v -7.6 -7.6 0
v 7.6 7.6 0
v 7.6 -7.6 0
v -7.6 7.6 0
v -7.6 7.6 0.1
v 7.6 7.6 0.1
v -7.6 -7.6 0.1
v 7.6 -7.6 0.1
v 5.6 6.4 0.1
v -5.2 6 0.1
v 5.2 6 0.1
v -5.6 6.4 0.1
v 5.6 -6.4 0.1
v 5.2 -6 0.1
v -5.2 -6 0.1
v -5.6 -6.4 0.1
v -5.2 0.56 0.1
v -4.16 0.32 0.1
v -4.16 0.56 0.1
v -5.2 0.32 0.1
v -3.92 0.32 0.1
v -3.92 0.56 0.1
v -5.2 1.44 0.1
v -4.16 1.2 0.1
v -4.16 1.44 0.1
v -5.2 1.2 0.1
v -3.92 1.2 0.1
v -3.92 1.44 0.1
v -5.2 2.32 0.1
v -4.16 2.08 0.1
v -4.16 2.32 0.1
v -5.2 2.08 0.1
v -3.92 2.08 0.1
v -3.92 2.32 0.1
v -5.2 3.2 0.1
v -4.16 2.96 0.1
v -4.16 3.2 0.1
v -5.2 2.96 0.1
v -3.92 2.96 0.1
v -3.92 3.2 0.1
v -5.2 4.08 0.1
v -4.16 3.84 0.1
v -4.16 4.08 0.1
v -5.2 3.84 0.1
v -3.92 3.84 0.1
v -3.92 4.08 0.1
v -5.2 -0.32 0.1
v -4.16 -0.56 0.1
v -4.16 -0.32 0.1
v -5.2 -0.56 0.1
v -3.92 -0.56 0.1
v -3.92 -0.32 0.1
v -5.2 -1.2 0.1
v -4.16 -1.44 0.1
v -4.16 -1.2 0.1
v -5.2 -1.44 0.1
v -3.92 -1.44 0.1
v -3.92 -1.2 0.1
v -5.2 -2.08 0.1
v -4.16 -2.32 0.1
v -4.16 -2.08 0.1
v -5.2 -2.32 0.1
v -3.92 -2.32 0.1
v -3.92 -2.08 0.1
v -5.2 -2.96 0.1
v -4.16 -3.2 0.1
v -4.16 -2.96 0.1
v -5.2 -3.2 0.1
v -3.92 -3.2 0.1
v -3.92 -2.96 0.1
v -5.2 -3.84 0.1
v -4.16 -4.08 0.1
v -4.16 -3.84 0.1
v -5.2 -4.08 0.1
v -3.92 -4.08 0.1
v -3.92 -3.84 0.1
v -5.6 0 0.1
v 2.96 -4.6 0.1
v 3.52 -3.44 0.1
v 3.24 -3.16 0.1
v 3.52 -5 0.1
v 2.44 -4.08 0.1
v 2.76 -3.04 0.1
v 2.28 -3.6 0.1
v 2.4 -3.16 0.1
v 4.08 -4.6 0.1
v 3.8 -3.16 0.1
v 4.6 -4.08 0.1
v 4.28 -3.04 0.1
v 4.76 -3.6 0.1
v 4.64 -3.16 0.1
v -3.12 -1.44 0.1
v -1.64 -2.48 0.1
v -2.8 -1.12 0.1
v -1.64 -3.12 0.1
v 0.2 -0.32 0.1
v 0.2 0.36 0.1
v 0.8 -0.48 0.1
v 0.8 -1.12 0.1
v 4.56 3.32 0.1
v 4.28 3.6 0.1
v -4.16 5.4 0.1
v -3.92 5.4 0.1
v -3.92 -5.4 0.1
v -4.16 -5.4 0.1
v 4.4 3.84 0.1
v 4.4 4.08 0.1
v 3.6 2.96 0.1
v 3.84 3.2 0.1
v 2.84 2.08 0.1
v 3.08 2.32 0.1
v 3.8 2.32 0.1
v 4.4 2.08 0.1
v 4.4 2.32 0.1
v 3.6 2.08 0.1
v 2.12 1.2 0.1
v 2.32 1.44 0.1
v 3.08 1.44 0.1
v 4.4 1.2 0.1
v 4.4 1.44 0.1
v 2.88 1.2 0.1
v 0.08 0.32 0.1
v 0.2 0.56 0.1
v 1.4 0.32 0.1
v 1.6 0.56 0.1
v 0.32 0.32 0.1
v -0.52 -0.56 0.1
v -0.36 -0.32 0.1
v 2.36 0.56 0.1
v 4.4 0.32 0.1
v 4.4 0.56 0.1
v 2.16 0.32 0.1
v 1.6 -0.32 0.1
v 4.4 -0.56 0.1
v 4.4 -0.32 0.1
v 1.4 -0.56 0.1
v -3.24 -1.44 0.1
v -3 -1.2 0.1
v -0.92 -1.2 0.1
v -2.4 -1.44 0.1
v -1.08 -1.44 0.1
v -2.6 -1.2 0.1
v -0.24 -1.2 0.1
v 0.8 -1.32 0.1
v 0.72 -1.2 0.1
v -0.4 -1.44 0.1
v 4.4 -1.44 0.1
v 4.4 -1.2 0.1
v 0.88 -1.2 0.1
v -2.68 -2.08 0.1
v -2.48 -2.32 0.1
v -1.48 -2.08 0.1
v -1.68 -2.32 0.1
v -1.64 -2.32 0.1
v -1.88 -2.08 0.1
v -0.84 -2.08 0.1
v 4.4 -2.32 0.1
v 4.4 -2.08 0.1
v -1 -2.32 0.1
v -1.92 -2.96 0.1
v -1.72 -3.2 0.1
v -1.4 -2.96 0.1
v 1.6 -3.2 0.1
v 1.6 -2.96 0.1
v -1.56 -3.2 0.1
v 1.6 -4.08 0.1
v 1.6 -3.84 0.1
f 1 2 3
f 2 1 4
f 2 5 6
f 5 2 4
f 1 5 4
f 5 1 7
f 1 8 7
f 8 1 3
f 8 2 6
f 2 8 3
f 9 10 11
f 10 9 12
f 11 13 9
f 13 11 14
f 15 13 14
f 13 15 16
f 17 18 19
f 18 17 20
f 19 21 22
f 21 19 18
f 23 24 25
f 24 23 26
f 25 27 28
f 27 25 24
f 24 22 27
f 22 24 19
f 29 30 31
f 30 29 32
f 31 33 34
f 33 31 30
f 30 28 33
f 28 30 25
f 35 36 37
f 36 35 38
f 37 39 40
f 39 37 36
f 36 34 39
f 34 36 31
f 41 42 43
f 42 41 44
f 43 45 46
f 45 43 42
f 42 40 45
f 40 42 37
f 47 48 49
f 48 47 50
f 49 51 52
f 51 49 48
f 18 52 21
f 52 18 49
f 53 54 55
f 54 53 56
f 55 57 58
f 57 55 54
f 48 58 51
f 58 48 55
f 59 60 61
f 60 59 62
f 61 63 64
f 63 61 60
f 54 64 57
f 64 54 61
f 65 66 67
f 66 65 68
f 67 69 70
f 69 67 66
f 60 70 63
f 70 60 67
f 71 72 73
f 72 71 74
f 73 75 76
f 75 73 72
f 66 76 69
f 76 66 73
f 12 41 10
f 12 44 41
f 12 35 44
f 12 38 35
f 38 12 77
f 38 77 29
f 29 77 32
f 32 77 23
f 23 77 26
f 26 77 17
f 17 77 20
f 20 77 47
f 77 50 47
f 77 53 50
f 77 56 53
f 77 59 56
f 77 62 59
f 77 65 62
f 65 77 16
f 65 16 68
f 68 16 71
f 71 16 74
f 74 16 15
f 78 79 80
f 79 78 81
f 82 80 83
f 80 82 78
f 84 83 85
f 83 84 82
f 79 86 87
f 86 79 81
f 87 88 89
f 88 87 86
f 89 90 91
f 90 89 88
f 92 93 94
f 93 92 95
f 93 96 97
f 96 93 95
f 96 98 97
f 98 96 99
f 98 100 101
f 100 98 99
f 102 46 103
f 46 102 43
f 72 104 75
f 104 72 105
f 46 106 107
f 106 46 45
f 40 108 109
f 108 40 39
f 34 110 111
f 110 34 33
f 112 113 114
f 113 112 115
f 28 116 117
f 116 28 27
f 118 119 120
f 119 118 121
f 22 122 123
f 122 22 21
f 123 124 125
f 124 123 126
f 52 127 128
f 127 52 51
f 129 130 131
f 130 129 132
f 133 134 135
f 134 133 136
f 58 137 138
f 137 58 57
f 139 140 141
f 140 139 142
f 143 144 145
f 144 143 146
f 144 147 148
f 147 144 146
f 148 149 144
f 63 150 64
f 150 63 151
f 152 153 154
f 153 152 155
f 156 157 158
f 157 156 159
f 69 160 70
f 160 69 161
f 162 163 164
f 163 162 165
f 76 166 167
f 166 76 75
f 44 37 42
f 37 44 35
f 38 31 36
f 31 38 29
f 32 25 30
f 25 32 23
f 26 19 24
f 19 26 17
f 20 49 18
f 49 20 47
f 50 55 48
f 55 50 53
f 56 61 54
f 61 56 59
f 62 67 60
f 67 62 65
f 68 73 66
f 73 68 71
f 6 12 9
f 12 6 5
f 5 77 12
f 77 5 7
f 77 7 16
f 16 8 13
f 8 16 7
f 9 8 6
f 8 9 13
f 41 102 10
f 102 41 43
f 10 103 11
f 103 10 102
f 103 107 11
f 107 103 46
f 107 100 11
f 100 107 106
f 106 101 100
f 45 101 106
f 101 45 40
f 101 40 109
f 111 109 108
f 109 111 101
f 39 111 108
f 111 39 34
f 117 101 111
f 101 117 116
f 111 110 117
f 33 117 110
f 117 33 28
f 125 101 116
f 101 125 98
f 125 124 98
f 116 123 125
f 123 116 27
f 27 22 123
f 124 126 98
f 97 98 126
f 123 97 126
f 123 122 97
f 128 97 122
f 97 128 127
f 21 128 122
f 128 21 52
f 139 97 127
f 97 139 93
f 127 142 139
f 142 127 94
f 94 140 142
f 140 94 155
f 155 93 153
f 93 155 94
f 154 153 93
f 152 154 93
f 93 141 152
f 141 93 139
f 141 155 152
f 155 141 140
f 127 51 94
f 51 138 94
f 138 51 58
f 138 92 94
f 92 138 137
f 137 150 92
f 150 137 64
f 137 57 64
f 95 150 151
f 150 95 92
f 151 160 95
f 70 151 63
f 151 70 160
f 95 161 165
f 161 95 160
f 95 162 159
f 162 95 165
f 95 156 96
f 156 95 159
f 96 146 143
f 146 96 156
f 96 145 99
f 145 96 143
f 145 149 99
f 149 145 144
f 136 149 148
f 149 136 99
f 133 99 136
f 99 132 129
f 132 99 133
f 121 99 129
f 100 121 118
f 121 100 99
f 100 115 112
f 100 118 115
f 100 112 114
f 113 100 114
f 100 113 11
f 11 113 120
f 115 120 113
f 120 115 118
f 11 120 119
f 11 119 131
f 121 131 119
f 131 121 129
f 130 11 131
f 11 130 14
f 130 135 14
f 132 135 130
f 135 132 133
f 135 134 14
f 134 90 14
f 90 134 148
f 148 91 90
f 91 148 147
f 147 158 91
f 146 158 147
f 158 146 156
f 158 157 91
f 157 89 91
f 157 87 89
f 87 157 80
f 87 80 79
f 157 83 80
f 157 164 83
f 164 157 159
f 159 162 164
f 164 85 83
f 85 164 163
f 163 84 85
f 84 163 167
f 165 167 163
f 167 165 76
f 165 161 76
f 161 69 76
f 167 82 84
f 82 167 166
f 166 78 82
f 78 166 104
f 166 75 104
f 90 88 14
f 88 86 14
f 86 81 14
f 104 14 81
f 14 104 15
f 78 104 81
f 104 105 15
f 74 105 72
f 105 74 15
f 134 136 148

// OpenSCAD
// file: ../p/box5-12.scad
use <../lib.scad>
function ldraw_lib__box5_12() = [
// 0 Box with 5 Faces without Any Edges
// 0 Name: box5-12.dat
// 0 Author: Chris Dee [cwdee]
// 0 !LDRAW_ORG Primitive UPDATE 2009-02
// 0 !LICENSE Licensed under CC BY 4.0 : see CAreadme.txt
// 
// 0 BFC CERTIFY CCW
  [0,"BFC","CERTIFY"],
  [0,"BFC","CCW"],
// 
// 0 !HISTORY 2009-09-03 [PTadmin] Official Update 2009-02
// 
// 
// 4 16 1 1 1 1 1 -1 -1 1 -1 -1 1 1
  [4,16,1,1,1,1,1,-1,-1,1,-1,-1,1,1],
// 4 16 -1 0 1 1 0 1 1 1 1 -1 1 1
  [4,16,-1,0,1,1,0,1,1,1,1,-1,1,1],
// 4 16 -1 0 -1 -1 0 1 -1 1 1 -1 1 -1
  [4,16,-1,0,-1,-1,0,1,-1,1,1,-1,1,-1],
// 4 16 1 0 -1 -1 0 -1 -1 1 -1 1 1 -1
  [4,16,1,0,-1,-1,0,-1,-1,1,-1,1,1,-1],
// 4 16 1 0 1 1 0 -1 1 1 -1 1 1 1
  [4,16,1,0,1,1,0,-1,1,1,-1,1,1,1],
// 0
];
module ldraw_lib__box5_12(step=0, col=false, unit=2/5, alt=false, line=0.2, solid=!$preview)
    makepoly(ldraw_lib__box5_12(), step=step, col=col, unit=unit, alt=alt, line=line, solid=solid);
ldraw_lib__box5_12(line=0.2);
// main file
use <../lib.scad>
use <../p/box5-12.scad>
function ldraw_lib__4650852c() = [
// 0 Sticker  1.9 x  1.9 with Dark Pink Heart and Medical Chart
// 0 Name: 4650852c.dat
// 0 Author: Takeshi Takahashi [RainbowDolphin]
// 0 !LDRAW_ORG Part UPDATE 2024-08
// 0 !LICENSE Licensed under CC BY 4.0 : see CAreadme.txt
// 
// 0 BFC CERTIFY CCW
  [0,"BFC","CERTIFY"],
  [0,"BFC","CCW"],
// 
// 0 !KEYWORDS Set 3188, Vet
// 
// 0 !HISTORY 2024-09-30 [OrionP] Official Update 2024-08
// 
// 
// 1 16 0 -0.25 0 19 0 0 0 0.25 0 0 0 19 box5-12.dat
  [1,16,0,-0.25,0,19,0,0,0,0.25,0,0,0,19, ldraw_lib__box5_12()],
// 4 322 -14 -0.25 16 -13 -0.25 15 13 -0.25 15 14 -0.25 16
  [4,322,-14,-0.25,16,-13,-0.25,15,13,-0.25,15,14,-0.25,16],
// 4 322 14 -0.25 16 13 -0.25 15 13 -0.25 -15 14 -0.25 -16
  [4,322,14,-0.25,16,13,-0.25,15,13,-0.25,-15,14,-0.25,-16],
// 4 322 14 -0.25 -16 13 -0.25 -15 -13 -0.25 -15 -14 -0.25 -16
  [4,322,14,-0.25,-16,13,-0.25,-15,-13,-0.25,-15,-14,-0.25,-16],
// 4 322 -10.4 -0.25 1.4 -13 -0.25 1.4 -13 -0.25 0.8 -10.4 -0.25 0.8
  [4,322,-10.4,-0.25,1.4,-13,-0.25,1.4,-13,-0.25,0.8,-10.4,-0.25,0.8],
// 4 322 -9.8 -0.25 1.4 -10.4 -0.25 1.4 -10.4 -0.25 0.8 -9.8 -0.25 0.8
  [4,322,-9.8,-0.25,1.4,-10.4,-0.25,1.4,-10.4,-0.25,0.8,-9.8,-0.25,0.8],
// 4 322 -10.4 -0.25 3.6 -13 -0.25 3.6 -13 -0.25 3 -10.4 -0.25 3
  [4,322,-10.4,-0.25,3.6,-13,-0.25,3.6,-13,-0.25,3,-10.4,-0.25,3],
// 4 322 -9.8 -0.25 3.6 -10.4 -0.25 3.6 -10.4 -0.25 3 -9.8 -0.25 3
  [4,322,-9.8,-0.25,3.6,-10.4,-0.25,3.6,-10.4,-0.25,3,-9.8,-0.25,3],
// 4 322 -9.8 -0.25 3 -10.4 -0.25 3 -10.4 -0.25 1.4 -9.8 -0.25 1.4
  [4,322,-9.8,-0.25,3,-10.4,-0.25,3,-10.4,-0.25,1.4,-9.8,-0.25,1.4],
// 4 322 -10.4 -0.25 5.8 -13 -0.25 5.8 -13 -0.25 5.2 -10.4 -0.25 5.2
  [4,322,-10.4,-0.25,5.8,-13,-0.25,5.8,-13,-0.25,5.2,-10.4,-0.25,5.2],
// 4 322 -9.8 -0.25 5.8 -10.4 -0.25 5.8 -10.4 -0.25 5.2 -9.8 -0.25 5.2
  [4,322,-9.8,-0.25,5.8,-10.4,-0.25,5.8,-10.4,-0.25,5.2,-9.8,-0.25,5.2],
// 4 322 -9.8 -0.25 5.2 -10.4 -0.25 5.2 -10.4 -0.25 3.6 -9.8 -0.25 3.6
  [4,322,-9.8,-0.25,5.2,-10.4,-0.25,5.2,-10.4,-0.25,3.6,-9.8,-0.25,3.6],
// 4 322 -10.4 -0.25 8 -13 -0.25 8 -13 -0.25 7.4 -10.4 -0.25 7.4
  [4,322,-10.4,-0.25,8,-13,-0.25,8,-13,-0.25,7.4,-10.4,-0.25,7.4],
// 4 322 -9.8 -0.25 8 -10.4 -0.25 8 -10.4 -0.25 7.4 -9.8 -0.25 7.4
  [4,322,-9.8,-0.25,8,-10.4,-0.25,8,-10.4,-0.25,7.4,-9.8,-0.25,7.4],
// 4 322 -9.8 -0.25 7.4 -10.4 -0.25 7.4 -10.4 -0.25 5.8 -9.8 -0.25 5.8
  [4,322,-9.8,-0.25,7.4,-10.4,-0.25,7.4,-10.4,-0.25,5.8,-9.8,-0.25,5.8],
// 4 322 -10.4 -0.25 10.2 -13 -0.25 10.2 -13 -0.25 9.6 -10.4 -0.25 9.6
  [4,322,-10.4,-0.25,10.2,-13,-0.25,10.2,-13,-0.25,9.6,-10.4,-0.25,9.6],
// 4 322 -9.8 -0.25 10.2 -10.4 -0.25 10.2 -10.4 -0.25 9.6 -9.8 -0.25 9.6
  [4,322,-9.8,-0.25,10.2,-10.4,-0.25,10.2,-10.4,-0.25,9.6,-9.8,-0.25,9.6],
// 4 322 -9.8 -0.25 9.6 -10.4 -0.25 9.6 -10.4 -0.25 8 -9.8 -0.25 8
  [4,322,-9.8,-0.25,9.6,-10.4,-0.25,9.6,-10.4,-0.25,8,-9.8,-0.25,8],
// 4 322 -10.4 -0.25 -0.8 -13 -0.25 -0.8 -13 -0.25 -1.4 -10.4 -0.25 -1.4
  [4,322,-10.4,-0.25,-0.8,-13,-0.25,-0.8,-13,-0.25,-1.4,-10.4,-0.25,-1.4],
// 4 322 -9.8 -0.25 -0.8 -10.4 -0.25 -0.8 -10.4 -0.25 -1.4 -9.8 -0.25 -1.4
  [4,322,-9.8,-0.25,-0.8,-10.4,-0.25,-0.8,-10.4,-0.25,-1.4,-9.8,-0.25,-1.4],
// 4 322 -9.8 -0.25 0.8 -10.4 -0.25 0.8 -10.4 -0.25 -0.8 -9.8 -0.25 -0.8
  [4,322,-9.8,-0.25,0.8,-10.4,-0.25,0.8,-10.4,-0.25,-0.8,-9.8,-0.25,-0.8],
// 4 322 -10.4 -0.25 -3 -13 -0.25 -3 -13 -0.25 -3.6 -10.4 -0.25 -3.6
  [4,322,-10.4,-0.25,-3,-13,-0.25,-3,-13,-0.25,-3.6,-10.4,-0.25,-3.6],
// 4 322 -9.8 -0.25 -3 -10.4 -0.25 -3 -10.4 -0.25 -3.6 -9.8 -0.25 -3.6
  [4,322,-9.8,-0.25,-3,-10.4,-0.25,-3,-10.4,-0.25,-3.6,-9.8,-0.25,-3.6],
// 4 322 -9.8 -0.25 -1.4 -10.4 -0.25 -1.4 -10.4 -0.25 -3 -9.8 -0.25 -3
  [4,322,-9.8,-0.25,-1.4,-10.4,-0.25,-1.4,-10.4,-0.25,-3,-9.8,-0.25,-3],
// 4 322 -10.4 -0.25 -5.2 -13 -0.25 -5.2 -13 -0.25 -5.8 -10.4 -0.25 -5.8
  [4,322,-10.4,-0.25,-5.2,-13,-0.25,-5.2,-13,-0.25,-5.8,-10.4,-0.25,-5.8],
// 4 322 -9.8 -0.25 -5.2 -10.4 -0.25 -5.2 -10.4 -0.25 -5.8 -9.8 -0.25 -5.8
  [4,322,-9.8,-0.25,-5.2,-10.4,-0.25,-5.2,-10.4,-0.25,-5.8,-9.8,-0.25,-5.8],
// 4 322 -9.8 -0.25 -3.6 -10.4 -0.25 -3.6 -10.4 -0.25 -5.2 -9.8 -0.25 -5.2
  [4,322,-9.8,-0.25,-3.6,-10.4,-0.25,-3.6,-10.4,-0.25,-5.2,-9.8,-0.25,-5.2],
// 4 322 -10.4 -0.25 -7.4 -13 -0.25 -7.4 -13 -0.25 -8 -10.4 -0.25 -8
  [4,322,-10.4,-0.25,-7.4,-13,-0.25,-7.4,-13,-0.25,-8,-10.4,-0.25,-8],
// 4 322 -9.8 -0.25 -7.4 -10.4 -0.25 -7.4 -10.4 -0.25 -8 -9.8 -0.25 -8
  [4,322,-9.8,-0.25,-7.4,-10.4,-0.25,-7.4,-10.4,-0.25,-8,-9.8,-0.25,-8],
// 4 322 -9.8 -0.25 -5.8 -10.4 -0.25 -5.8 -10.4 -0.25 -7.4 -9.8 -0.25 -7.4
  [4,322,-9.8,-0.25,-5.8,-10.4,-0.25,-5.8,-10.4,-0.25,-7.4,-9.8,-0.25,-7.4],
// 4 322 -10.4 -0.25 -9.6 -13 -0.25 -9.6 -13 -0.25 -10.2 -10.4 -0.25 -10.2
  [4,322,-10.4,-0.25,-9.6,-13,-0.25,-9.6,-13,-0.25,-10.2,-10.4,-0.25,-10.2],
// 4 322 -9.8 -0.25 -9.6 -10.4 -0.25 -9.6 -10.4 -0.25 -10.2 -9.8 -0.25 -10.2
  [4,322,-9.8,-0.25,-9.6,-10.4,-0.25,-9.6,-10.4,-0.25,-10.2,-9.8,-0.25,-10.2],
// 4 322 -9.8 -0.25 -8 -10.4 -0.25 -8 -10.4 -0.25 -9.6 -9.8 -0.25 -9.6
  [4,322,-9.8,-0.25,-8,-10.4,-0.25,-8,-10.4,-0.25,-9.6,-9.8,-0.25,-9.6],
// 3 322 -14 -0.25 16 -13 -0.25 10.2 -13 -0.25 15
  [3,322,-14,-0.25,16,-13,-0.25,10.2,-13,-0.25,15],
// 3 322 -14 -0.25 16 -13 -0.25 9.6 -13 -0.25 10.2
  [3,322,-14,-0.25,16,-13,-0.25,9.6,-13,-0.25,10.2],
// 3 322 -14 -0.25 16 -13 -0.25 8 -13 -0.25 9.6
  [3,322,-14,-0.25,16,-13,-0.25,8,-13,-0.25,9.6],
// 4 322 -13 -0.25 7.4 -13 -0.25 8 -14 -0.25 16 -14 -0.25 0
  [4,322,-13,-0.25,7.4,-13,-0.25,8,-14,-0.25,16,-14,-0.25,0],
// 3 322 -13 -0.25 7.4 -14 -0.25 0 -13 -0.25 5.8
  [3,322,-13,-0.25,7.4,-14,-0.25,0,-13,-0.25,5.8],
// 3 322 -13 -0.25 5.8 -14 -0.25 0 -13 -0.25 5.2
  [3,322,-13,-0.25,5.8,-14,-0.25,0,-13,-0.25,5.2],
// 3 322 -13 -0.25 5.2 -14 -0.25 0 -13 -0.25 3.6
  [3,322,-13,-0.25,5.2,-14,-0.25,0,-13,-0.25,3.6],
// 3 322 -13 -0.25 3.6 -14 -0.25 0 -13 -0.25 3
  [3,322,-13,-0.25,3.6,-14,-0.25,0,-13,-0.25,3],
// 3 322 -13 -0.25 3 -14 -0.25 0 -13 -0.25 1.4
  [3,322,-13,-0.25,3,-14,-0.25,0,-13,-0.25,1.4],
// 3 322 -13 -0.25 1.4 -14 -0.25 0 -13 -0.25 0.8
  [3,322,-13,-0.25,1.4,-14,-0.25,0,-13,-0.25,0.8],
// 3 322 -13 -0.25 0.8 -14 -0.25 0 -13 -0.25 -0.8
  [3,322,-13,-0.25,0.8,-14,-0.25,0,-13,-0.25,-0.8],
// 3 322 -14 -0.25 0 -13 -0.25 -1.4 -13 -0.25 -0.8
  [3,322,-14,-0.25,0,-13,-0.25,-1.4,-13,-0.25,-0.8],
// 3 322 -14 -0.25 0 -13 -0.25 -3 -13 -0.25 -1.4
  [3,322,-14,-0.25,0,-13,-0.25,-3,-13,-0.25,-1.4],
// 3 322 -14 -0.25 0 -13 -0.25 -3.6 -13 -0.25 -3
  [3,322,-14,-0.25,0,-13,-0.25,-3.6,-13,-0.25,-3],
// 3 322 -14 -0.25 0 -13 -0.25 -5.2 -13 -0.25 -3.6
  [3,322,-14,-0.25,0,-13,-0.25,-5.2,-13,-0.25,-3.6],
// 3 322 -14 -0.25 0 -13 -0.25 -5.8 -13 -0.25 -5.2
  [3,322,-14,-0.25,0,-13,-0.25,-5.8,-13,-0.25,-5.2],
// 4 322 -13 -0.25 -7.4 -13 -0.25 -5.8 -14 -0.25 0 -14 -0.25 -16
  [4,322,-13,-0.25,-7.4,-13,-0.25,-5.8,-14,-0.25,0,-14,-0.25,-16],
// 3 322 -13 -0.25 -7.4 -14 -0.25 -16 -13 -0.25 -8
  [3,322,-13,-0.25,-7.4,-14,-0.25,-16,-13,-0.25,-8],
// 3 322 -13 -0.25 -8 -14 -0.25 -16 -13 -0.25 -9.6
  [3,322,-13,-0.25,-8,-14,-0.25,-16,-13,-0.25,-9.6],
// 3 322 -13 -0.25 -9.6 -14 -0.25 -16 -13 -0.25 -10.2
  [3,322,-13,-0.25,-9.6,-14,-0.25,-16,-13,-0.25,-10.2],
// 3 322 -13 -0.25 -10.2 -14 -0.25 -16 -13 -0.25 -15
  [3,322,-13,-0.25,-10.2,-14,-0.25,-16,-13,-0.25,-15],
// 4 5 7.4 -0.25 -11.5 8.8 -0.25 -12.5 8.8 -0.25 -8.6 8.1 -0.25 -7.9
  [4,5,7.4,-0.25,-11.5,8.8,-0.25,-12.5,8.8,-0.25,-8.6,8.1,-0.25,-7.9],
// 4 5 6.1 -0.25 -10.2 7.4 -0.25 -11.5 8.1 -0.25 -7.9 6.9 -0.25 -7.6
  [4,5,6.1,-0.25,-10.2,7.4,-0.25,-11.5,8.1,-0.25,-7.9,6.9,-0.25,-7.6],
// 4 5 5.7 -0.25 -9 6.1 -0.25 -10.2 6.9 -0.25 -7.6 6 -0.25 -7.9
  [4,5,5.7,-0.25,-9,6.1,-0.25,-10.2,6.9,-0.25,-7.6,6,-0.25,-7.9],
// 4 5 8.8 -0.25 -8.6 8.8 -0.25 -12.5 10.2 -0.25 -11.5 9.5 -0.25 -7.9
  [4,5,8.8,-0.25,-8.6,8.8,-0.25,-12.5,10.2,-0.25,-11.5,9.5,-0.25,-7.9],
// 4 5 9.5 -0.25 -7.9 10.2 -0.25 -11.5 11.5 -0.25 -10.2 10.7 -0.25 -7.6
  [4,5,9.5,-0.25,-7.9,10.2,-0.25,-11.5,11.5,-0.25,-10.2,10.7,-0.25,-7.6],
// 4 5 10.7 -0.25 -7.6 11.5 -0.25 -10.2 11.9 -0.25 -9 11.6 -0.25 -7.9
  [4,5,10.7,-0.25,-7.6,11.5,-0.25,-10.2,11.9,-0.25,-9,11.6,-0.25,-7.9],
// 4 5 -4.1 -0.25 -6.2 -7 -0.25 -2.8 -7.8 -0.25 -3.6 -4.1 -0.25 -7.8
  [4,5,-4.1,-0.25,-6.2,-7,-0.25,-2.8,-7.8,-0.25,-3.6,-4.1,-0.25,-7.8],
// 4 5 -4.1 -0.25 -6.2 -4.1 -0.25 -7.8 0.5 -0.25 -0.8 0.5 -0.25 0.9
  [4,5,-4.1,-0.25,-6.2,-4.1,-0.25,-7.8,0.5,-0.25,-0.8,0.5,-0.25,0.9],
// 4 5 2 -0.25 -1.2 0.5 -0.25 0.9 0.5 -0.25 -0.8 2 -0.25 -2.8
  [4,5,2,-0.25,-1.2,0.5,-0.25,0.9,0.5,-0.25,-0.8,2,-0.25,-2.8],
// 4 5 10.7 -0.25 9 2 -0.25 -1.2 2 -0.25 -2.8 11.4 -0.25 8.3
  [4,5,10.7,-0.25,9,2,-0.25,-1.2,2,-0.25,-2.8,11.4,-0.25,8.3],
// 4 322 -10.4 -0.25 10.2 -9.8 -0.25 10.2 -9.8 -0.25 13.5 -10.4 -0.25 13.5
  [4,322,-10.4,-0.25,10.2,-9.8,-0.25,10.2,-9.8,-0.25,13.5,-10.4,-0.25,13.5],
// 4 322 -9.8 -0.25 -10.2 -10.4 -0.25 -10.2 -10.4 -0.25 -13.5 -9.8 -0.25 -13.5
  [4,322,-9.8,-0.25,-10.2,-10.4,-0.25,-10.2,-10.4,-0.25,-13.5,-9.8,-0.25,-13.5],
// 4 322 11 -0.25 10.2 -9.8 -0.25 10.2 -9.8 -0.25 9.6 11 -0.25 9.6
  [4,322,11,-0.25,10.2,-9.8,-0.25,10.2,-9.8,-0.25,9.6,11,-0.25,9.6],
// 4 322 9.6 -0.25 8 -9.8 -0.25 8 -9.8 -0.25 7.4 9 -0.25 7.4
  [4,322,9.6,-0.25,8,-9.8,-0.25,8,-9.8,-0.25,7.4,9,-0.25,7.4],
// 4 322 7.7 -0.25 5.8 -9.8 -0.25 5.8 -9.8 -0.25 5.2 7.1 -0.25 5.2
  [4,322,7.7,-0.25,5.8,-9.8,-0.25,5.8,-9.8,-0.25,5.2,7.1,-0.25,5.2],
// 4 322 11 -0.25 5.2 11 -0.25 5.8 9.5 -0.25 5.8 9 -0.25 5.2
  [4,322,11,-0.25,5.2,11,-0.25,5.8,9.5,-0.25,5.8,9,-0.25,5.2],
// 4 322 5.8 -0.25 3.6 -9.8 -0.25 3.6 -9.8 -0.25 3 5.3 -0.25 3
  [4,322,5.8,-0.25,3.6,-9.8,-0.25,3.6,-9.8,-0.25,3,5.3,-0.25,3],
// 4 322 11 -0.25 3 11 -0.25 3.6 7.7 -0.25 3.6 7.2 -0.25 3
  [4,322,11,-0.25,3,11,-0.25,3.6,7.7,-0.25,3.6,7.2,-0.25,3],
// 4 322 -9.8 -0.25 1.4 -9.8 -0.25 0.8 0.2 -0.25 0.8 0.5 -0.25 1.4
  [4,322,-9.8,-0.25,1.4,-9.8,-0.25,0.8,0.2,-0.25,0.8,0.5,-0.25,1.4],
// 4 322 3.5 -0.25 0.8 4 -0.25 1.4 0.5 -0.25 1.4 0.8 -0.25 0.8
  [4,322,3.5,-0.25,0.8,4,-0.25,1.4,0.5,-0.25,1.4,0.8,-0.25,0.8],
// 4 322 -0.9 -0.25 -0.8 -9.8 -0.25 -0.8 -9.8 -0.25 -1.4 -1.3 -0.25 -1.4
  [4,322,-0.9,-0.25,-0.8,-9.8,-0.25,-0.8,-9.8,-0.25,-1.4,-1.3,-0.25,-1.4],
// 4 322 11 -0.25 0.8 11 -0.25 1.4 5.9 -0.25 1.4 5.4 -0.25 0.8
  [4,322,11,-0.25,0.8,11,-0.25,1.4,5.9,-0.25,1.4,5.4,-0.25,0.8],
// 4 322 11 -0.25 -1.4 11 -0.25 -0.8 4 -0.25 -0.8 3.5 -0.25 -1.4
  [4,322,11,-0.25,-1.4,11,-0.25,-0.8,4,-0.25,-0.8,3.5,-0.25,-1.4],
// 4 322 -7.5 -0.25 -3 -9.8 -0.25 -3 -9.8 -0.25 -3.6 -8.1 -0.25 -3.6
  [4,322,-7.5,-0.25,-3,-9.8,-0.25,-3,-9.8,-0.25,-3.6,-8.1,-0.25,-3.6],
// 4 322 -2.3 -0.25 -3 -6.5 -0.25 -3 -6 -0.25 -3.6 -2.7 -0.25 -3.6
  [4,322,-2.3,-0.25,-3,-6.5,-0.25,-3,-6,-0.25,-3.6,-2.7,-0.25,-3.6],
// 4 322 1.8 -0.25 -3 -0.6 -0.25 -3 -1 -0.25 -3.6 2 -0.25 -3.3
  [4,322,1.8,-0.25,-3,-0.6,-0.25,-3,-1,-0.25,-3.6,2,-0.25,-3.3],
// 4 322 2 -0.25 -3.3 -1 -0.25 -3.6 11 -0.25 -3.6 11 -0.25 -3
  [4,322,2,-0.25,-3.3,-1,-0.25,-3.6,11,-0.25,-3.6,11,-0.25,-3],
// 3 322 11 -0.25 -3 2.2 -0.25 -3 2 -0.25 -3.3
  [3,322,11,-0.25,-3,2.2,-0.25,-3,2,-0.25,-3.3],
// 4 322 -6.7 -0.25 -5.2 -9.8 -0.25 -5.2 -9.8 -0.25 -5.8 -6.2 -0.25 -5.8
  [4,322,-6.7,-0.25,-5.2,-9.8,-0.25,-5.2,-9.8,-0.25,-5.8,-6.2,-0.25,-5.8],
// 4 322 -3.7 -0.25 -5.2 -4.7 -0.25 -5.2 -4.2 -0.25 -5.8 -4.1 -0.25 -5.8
  [4,322,-3.7,-0.25,-5.2,-4.7,-0.25,-5.2,-4.2,-0.25,-5.8,-4.1,-0.25,-5.8],
// 4 322 11 -0.25 -5.2 -2.1 -0.25 -5.2 -2.5 -0.25 -5.8 11 -0.25 -5.8
  [4,322,11,-0.25,-5.2,-2.1,-0.25,-5.2,-2.5,-0.25,-5.8,11,-0.25,-5.8],
// 4 322 -4.8 -0.25 -7.4 -9.8 -0.25 -7.4 -9.8 -0.25 -8 -4.3 -0.25 -8
  [4,322,-4.8,-0.25,-7.4,-9.8,-0.25,-7.4,-9.8,-0.25,-8,-4.3,-0.25,-8],
// 4 322 -3.5 -0.25 -7.4 -3.9 -0.25 -8 4 -0.25 -8 4 -0.25 -7.4
  [4,322,-3.5,-0.25,-7.4,-3.9,-0.25,-8,4,-0.25,-8,4,-0.25,-7.4],
// 4 322 4 -0.25 -9.6 -9.8 -0.25 -9.6 -9.8 -0.25 -10.2 4 -0.25 -10.2
  [4,322,4,-0.25,-9.6,-9.8,-0.25,-9.6,-9.8,-0.25,-10.2,4,-0.25,-10.2],
// 4 15 -10.4 -0.25 9.6 -13 -0.25 9.6 -13 -0.25 8 -10.4 -0.25 8
  [4,15,-10.4,-0.25,9.6,-13,-0.25,9.6,-13,-0.25,8,-10.4,-0.25,8],
// 4 15 -10.4 -0.25 7.4 -13 -0.25 7.4 -13 -0.25 5.8 -10.4 -0.25 5.8
  [4,15,-10.4,-0.25,7.4,-13,-0.25,7.4,-13,-0.25,5.8,-10.4,-0.25,5.8],
// 4 15 -10.4 -0.25 5.2 -13 -0.25 5.2 -13 -0.25 3.6 -10.4 -0.25 3.6
  [4,15,-10.4,-0.25,5.2,-13,-0.25,5.2,-13,-0.25,3.6,-10.4,-0.25,3.6],
// 4 15 -10.4 -0.25 3 -13 -0.25 3 -13 -0.25 1.4 -10.4 -0.25 1.4
  [4,15,-10.4,-0.25,3,-13,-0.25,3,-13,-0.25,1.4,-10.4,-0.25,1.4],
// 4 15 -10.4 -0.25 0.8 -13 -0.25 0.8 -13 -0.25 -0.8 -10.4 -0.25 -0.8
  [4,15,-10.4,-0.25,0.8,-13,-0.25,0.8,-13,-0.25,-0.8,-10.4,-0.25,-0.8],
// 4 15 -10.4 -0.25 -1.4 -13 -0.25 -1.4 -13 -0.25 -3 -10.4 -0.25 -3
  [4,15,-10.4,-0.25,-1.4,-13,-0.25,-1.4,-13,-0.25,-3,-10.4,-0.25,-3],
// 4 15 -10.4 -0.25 -3.6 -13 -0.25 -3.6 -13 -0.25 -5.2 -10.4 -0.25 -5.2
  [4,15,-10.4,-0.25,-3.6,-13,-0.25,-3.6,-13,-0.25,-5.2,-10.4,-0.25,-5.2],
// 4 15 -10.4 -0.25 -5.8 -13 -0.25 -5.8 -13 -0.25 -7.4 -10.4 -0.25 -7.4
  [4,15,-10.4,-0.25,-5.8,-13,-0.25,-5.8,-13,-0.25,-7.4,-10.4,-0.25,-7.4],
// 4 15 -10.4 -0.25 -8 -13 -0.25 -8 -13 -0.25 -9.6 -10.4 -0.25 -9.6
  [4,15,-10.4,-0.25,-8,-13,-0.25,-8,-13,-0.25,-9.6,-10.4,-0.25,-9.6],
// 4 15 14 -0.25 16 19 -0.25 19 -19 -0.25 19 -14 -0.25 16
  [4,15,14,-0.25,16,19,-0.25,19,-19,-0.25,19,-14,-0.25,16],
// 4 15 -14 -0.25 0 -14 -0.25 16 -19 -0.25 19 -19 -0.25 -19
  [4,15,-14,-0.25,0,-14,-0.25,16,-19,-0.25,19,-19,-0.25,-19],
// 3 15 -14 -0.25 0 -19 -0.25 -19 -14 -0.25 -16
  [3,15,-14,-0.25,0,-19,-0.25,-19,-14,-0.25,-16],
// 4 15 14 -0.25 -16 -14 -0.25 -16 -19 -0.25 -19 19 -0.25 -19
  [4,15,14,-0.25,-16,-14,-0.25,-16,-19,-0.25,-19,19,-0.25,-19],
// 4 15 14 -0.25 16 14 -0.25 -16 19 -0.25 -19 19 -0.25 19
  [4,15,14,-0.25,16,14,-0.25,-16,19,-0.25,-19,19,-0.25,19],
// 4 15 -13 -0.25 15 -13 -0.25 10.2 -10.4 -0.25 10.2 -10.4 -0.25 13.5
  [4,15,-13,-0.25,15,-13,-0.25,10.2,-10.4,-0.25,10.2,-10.4,-0.25,13.5],
// 4 15 -13 -0.25 15 -10.4 -0.25 13.5 -9.8 -0.25 13.5 13 -0.25 15
  [4,15,-13,-0.25,15,-10.4,-0.25,13.5,-9.8,-0.25,13.5,13,-0.25,15],
// 4 15 11 -0.25 10.2 13 -0.25 15 -9.8 -0.25 13.5 -9.8 -0.25 10.2
  [4,15,11,-0.25,10.2,13,-0.25,15,-9.8,-0.25,13.5,-9.8,-0.25,10.2],
// 4 15 13 -0.25 15 11 -0.25 10.2 11 -0.25 9.6 11.4 -0.25 8.3
  [4,15,13,-0.25,15,11,-0.25,10.2,11,-0.25,9.6,11.4,-0.25,8.3],
// 3 15 11 -0.25 9.6 10.7 -0.25 9 11.4 -0.25 8.3
  [3,15,11,-0.25,9.6,10.7,-0.25,9,11.4,-0.25,8.3],
// 4 15 10.7 -0.25 9 11 -0.25 9.6 -9.8 -0.25 9.6 -9.8 -0.25 8
  [4,15,10.7,-0.25,9,11,-0.25,9.6,-9.8,-0.25,9.6,-9.8,-0.25,8],
// 3 15 10.7 -0.25 9 -9.8 -0.25 8 9.6 -0.25 8
  [3,15,10.7,-0.25,9,-9.8,-0.25,8,9.6,-0.25,8],
// 4 15 7.7 -0.25 5.8 10.7 -0.25 9 9.6 -0.25 8 9 -0.25 7.4
  [4,15,7.7,-0.25,5.8,10.7,-0.25,9,9.6,-0.25,8,9,-0.25,7.4],
// 4 15 -9.8 -0.25 5.8 7.7 -0.25 5.8 9 -0.25 7.4 -9.8 -0.25 7.4
  [4,15,-9.8,-0.25,5.8,7.7,-0.25,5.8,9,-0.25,7.4,-9.8,-0.25,7.4],
// 4 15 10.7 -0.25 9 7.7 -0.25 5.8 5.8 -0.25 3.6 5.3 -0.25 3
  [4,15,10.7,-0.25,9,7.7,-0.25,5.8,5.8,-0.25,3.6,5.3,-0.25,3],
// 3 15 7.7 -0.25 5.8 7.1 -0.25 5.2 5.8 -0.25 3.6
  [3,15,7.7,-0.25,5.8,7.1,-0.25,5.2,5.8,-0.25,3.6],
// 4 15 -9.8 -0.25 3.6 5.8 -0.25 3.6 7.1 -0.25 5.2 -9.8 -0.25 5.2
  [4,15,-9.8,-0.25,3.6,5.8,-0.25,3.6,7.1,-0.25,5.2,-9.8,-0.25,5.2],
// 4 15 2 -0.25 -1.2 10.7 -0.25 9 5.3 -0.25 3 4 -0.25 1.4
  [4,15,2,-0.25,-1.2,10.7,-0.25,9,5.3,-0.25,3,4,-0.25,1.4],
// 3 15 4 -0.25 1.4 3.5 -0.25 0.8 2 -0.25 -1.2
  [3,15,4,-0.25,1.4,3.5,-0.25,0.8,2,-0.25,-1.2],
// 4 15 0.5 -0.25 1.4 4 -0.25 1.4 5.3 -0.25 3 -9.8 -0.25 3
  [4,15,0.5,-0.25,1.4,4,-0.25,1.4,5.3,-0.25,3,-9.8,-0.25,3],
// 3 15 -9.8 -0.25 3 -9.8 -0.25 1.4 0.5 -0.25 1.4
  [3,15,-9.8,-0.25,3,-9.8,-0.25,1.4,0.5,-0.25,1.4],
// 3 15 3.5 -0.25 0.8 0.8 -0.25 0.8 2 -0.25 -1.2
  [3,15,3.5,-0.25,0.8,0.8,-0.25,0.8,2,-0.25,-1.2],
// 3 15 0.5 -0.25 0.9 2 -0.25 -1.2 0.8 -0.25 0.8
  [3,15,0.5,-0.25,0.9,2,-0.25,-1.2,0.8,-0.25,0.8],
// 3 15 0.5 -0.25 1.4 0.5 -0.25 0.9 0.8 -0.25 0.8
  [3,15,0.5,-0.25,1.4,0.5,-0.25,0.9,0.8,-0.25,0.8],
// 3 15 0.5 -0.25 1.4 0.2 -0.25 0.8 0.5 -0.25 0.9
  [3,15,0.5,-0.25,1.4,0.2,-0.25,0.8,0.5,-0.25,0.9],
// 4 15 0.5 -0.25 0.9 0.2 -0.25 0.8 -0.9 -0.25 -0.8 -1.3 -0.25 -1.4
  [4,15,0.5,-0.25,0.9,0.2,-0.25,0.8,-0.9,-0.25,-0.8,-1.3,-0.25,-1.4],
// 4 15 -0.9 -0.25 -0.8 0.2 -0.25 0.8 -9.8 -0.25 0.8 -9.8 -0.25 -0.8
  [4,15,-0.9,-0.25,-0.8,0.2,-0.25,0.8,-9.8,-0.25,0.8,-9.8,-0.25,-0.8],
// 4 15 0.5 -0.25 0.9 -1.3 -0.25 -1.4 -2.3 -0.25 -3 -4.1 -0.25 -6.2
  [4,15,0.5,-0.25,0.9,-1.3,-0.25,-1.4,-2.3,-0.25,-3,-4.1,-0.25,-6.2],
// 4 15 -6.5 -0.25 -3 -2.3 -0.25 -3 -1.3 -0.25 -1.4 -7 -0.25 -2.8
  [4,15,-6.5,-0.25,-3,-2.3,-0.25,-3,-1.3,-0.25,-1.4,-7,-0.25,-2.8],
// 4 15 -6 -0.25 -3.6 -6.5 -0.25 -3 -7 -0.25 -2.8 -4.7 -0.25 -5.2
  [4,15,-6,-0.25,-3.6,-6.5,-0.25,-3,-7,-0.25,-2.8,-4.7,-0.25,-5.2],
// 4 15 -4.7 -0.25 -5.2 -7 -0.25 -2.8 -4.1 -0.25 -6.2 -4.2 -0.25 -5.8
  [4,15,-4.7,-0.25,-5.2,-7,-0.25,-2.8,-4.1,-0.25,-6.2,-4.2,-0.25,-5.8],
// 3 15 -4.1 -0.25 -5.8 -4.2 -0.25 -5.8 -4.1 -0.25 -6.2
  [3,15,-4.1,-0.25,-5.8,-4.2,-0.25,-5.8,-4.1,-0.25,-6.2],
// 3 15 -3.7 -0.25 -5.2 -4.1 -0.25 -5.8 -4.1 -0.25 -6.2
  [3,15,-3.7,-0.25,-5.2,-4.1,-0.25,-5.8,-4.1,-0.25,-6.2],
// 4 15 -2.7 -0.25 -3.6 -3.7 -0.25 -5.2 -4.1 -0.25 -6.2 -2.3 -0.25 -3
  [4,15,-2.7,-0.25,-3.6,-3.7,-0.25,-5.2,-4.1,-0.25,-6.2,-2.3,-0.25,-3],
// 4 15 -3.7 -0.25 -5.2 -2.7 -0.25 -3.6 -6 -0.25 -3.6 -4.7 -0.25 -5.2
  [4,15,-3.7,-0.25,-5.2,-2.7,-0.25,-3.6,-6,-0.25,-3.6,-4.7,-0.25,-5.2],
// 3 15 -1.3 -0.25 -1.4 -9.8 -0.25 -1.4 -7 -0.25 -2.8
  [3,15,-1.3,-0.25,-1.4,-9.8,-0.25,-1.4,-7,-0.25,-2.8],
// 4 15 -7.5 -0.25 -3 -7 -0.25 -2.8 -9.8 -0.25 -1.4 -9.8 -0.25 -3
  [4,15,-7.5,-0.25,-3,-7,-0.25,-2.8,-9.8,-0.25,-1.4,-9.8,-0.25,-3],
// 4 15 -7.8 -0.25 -3.6 -7 -0.25 -2.8 -7.5 -0.25 -3 -8.1 -0.25 -3.6
  [4,15,-7.8,-0.25,-3.6,-7,-0.25,-2.8,-7.5,-0.25,-3,-8.1,-0.25,-3.6],
// 4 15 -7.8 -0.25 -3.6 -8.1 -0.25 -3.6 -9.8 -0.25 -5.2 -6.7 -0.25 -5.2
  [4,15,-7.8,-0.25,-3.6,-8.1,-0.25,-3.6,-9.8,-0.25,-5.2,-6.7,-0.25,-5.2],
// 3 15 -8.1 -0.25 -3.6 -9.8 -0.25 -3.6 -9.8 -0.25 -5.2
  [3,15,-8.1,-0.25,-3.6,-9.8,-0.25,-3.6,-9.8,-0.25,-5.2],
// 4 15 -7.8 -0.25 -3.6 -6.7 -0.25 -5.2 -6.2 -0.25 -5.8 -4.1 -0.25 -7.8
  [4,15,-7.8,-0.25,-3.6,-6.7,-0.25,-5.2,-6.2,-0.25,-5.8,-4.1,-0.25,-7.8],
// 3 15 -6.2 -0.25 -5.8 -4.8 -0.25 -7.4 -4.1 -0.25 -7.8
  [3,15,-6.2,-0.25,-5.8,-4.8,-0.25,-7.4,-4.1,-0.25,-7.8],
// 4 15 -4.8 -0.25 -7.4 -6.2 -0.25 -5.8 -9.8 -0.25 -5.8 -9.8 -0.25 -7.4
  [4,15,-4.8,-0.25,-7.4,-6.2,-0.25,-5.8,-9.8,-0.25,-5.8,-9.8,-0.25,-7.4],
// 4 15 -4.1 -0.25 -7.8 -4.8 -0.25 -7.4 -4.3 -0.25 -8 -3.9 -0.25 -8
  [4,15,-4.1,-0.25,-7.8,-4.8,-0.25,-7.4,-4.3,-0.25,-8,-3.9,-0.25,-8],
// 4 15 -4.1 -0.25 -7.8 -3.9 -0.25 -8 -3.5 -0.25 -7.4 -2.5 -0.25 -5.8
  [4,15,-4.1,-0.25,-7.8,-3.9,-0.25,-8,-3.5,-0.25,-7.4,-2.5,-0.25,-5.8],
// 4 15 -4.1 -0.25 -7.8 -2.5 -0.25 -5.8 -2.1 -0.25 -5.2 0.5 -0.25 -0.8
  [4,15,-4.1,-0.25,-7.8,-2.5,-0.25,-5.8,-2.1,-0.25,-5.2,0.5,-0.25,-0.8],
// 4 15 0.5 -0.25 -0.8 -2.1 -0.25 -5.2 -1 -0.25 -3.6 -0.6 -0.25 -3
  [4,15,0.5,-0.25,-0.8,-2.1,-0.25,-5.2,-1,-0.25,-3.6,-0.6,-0.25,-3],
// 4 15 0.5 -0.25 -0.8 -0.6 -0.25 -3 1.8 -0.25 -3 2 -0.25 -2.8
  [4,15,0.5,-0.25,-0.8,-0.6,-0.25,-3,1.8,-0.25,-3,2,-0.25,-2.8],
// 4 15 2 -0.25 -2.8 1.8 -0.25 -3 2 -0.25 -3.3 2.2 -0.25 -3
  [4,15,2,-0.25,-2.8,1.8,-0.25,-3,2,-0.25,-3.3,2.2,-0.25,-3],
// 4 15 3.5 -0.25 -1.4 2 -0.25 -2.8 2.2 -0.25 -3 11 -0.25 -3
  [4,15,3.5,-0.25,-1.4,2,-0.25,-2.8,2.2,-0.25,-3,11,-0.25,-3],
// 3 15 4 -0.25 -0.8 2 -0.25 -2.8 3.5 -0.25 -1.4
  [3,15,4,-0.25,-0.8,2,-0.25,-2.8,3.5,-0.25,-1.4],
// 4 15 2 -0.25 -2.8 4 -0.25 -0.8 5.4 -0.25 0.8 5.9 -0.25 1.4
  [4,15,2,-0.25,-2.8,4,-0.25,-0.8,5.4,-0.25,0.8,5.9,-0.25,1.4],
// 3 15 7.2 -0.25 3 2 -0.25 -2.8 5.9 -0.25 1.4
  [3,15,7.2,-0.25,3,2,-0.25,-2.8,5.9,-0.25,1.4],
// 4 15 2 -0.25 -2.8 7.2 -0.25 3 7.7 -0.25 3.6 11.4 -0.25 8.3
  [4,15,2,-0.25,-2.8,7.2,-0.25,3,7.7,-0.25,3.6,11.4,-0.25,8.3],
// 3 15 11.4 -0.25 8.3 9 -0.25 5.2 9.5 -0.25 5.8
  [3,15,11.4,-0.25,8.3,9,-0.25,5.2,9.5,-0.25,5.8],
// 3 15 11.4 -0.25 8.3 7.7 -0.25 3.6 9 -0.25 5.2
  [3,15,11.4,-0.25,8.3,7.7,-0.25,3.6,9,-0.25,5.2],
// 3 15 11.4 -0.25 8.3 9.5 -0.25 5.8 11 -0.25 5.8
  [3,15,11.4,-0.25,8.3,9.5,-0.25,5.8,11,-0.25,5.8],
// 4 15 13 -0.25 15 11.4 -0.25 8.3 11 -0.25 5.8 11 -0.25 5.2
  [4,15,13,-0.25,15,11.4,-0.25,8.3,11,-0.25,5.8,11,-0.25,5.2],
// 3 15 13 -0.25 15 11 -0.25 5.2 11 -0.25 3.6
  [3,15,13,-0.25,15,11,-0.25,5.2,11,-0.25,3.6],
// 4 15 11 -0.25 3.6 11 -0.25 5.2 9 -0.25 5.2 7.7 -0.25 3.6
  [4,15,11,-0.25,3.6,11,-0.25,5.2,9,-0.25,5.2,7.7,-0.25,3.6],
// 3 15 13 -0.25 15 11 -0.25 3.6 11 -0.25 3
  [3,15,13,-0.25,15,11,-0.25,3.6,11,-0.25,3],
// 3 15 13 -0.25 15 11 -0.25 3 11 -0.25 1.4
  [3,15,13,-0.25,15,11,-0.25,3,11,-0.25,1.4],
// 4 15 11 -0.25 1.4 11 -0.25 3 7.2 -0.25 3 5.9 -0.25 1.4
  [4,15,11,-0.25,1.4,11,-0.25,3,7.2,-0.25,3,5.9,-0.25,1.4],
// 4 15 13 -0.25 15 11 -0.25 1.4 11 -0.25 0.8 13 -0.25 -15
  [4,15,13,-0.25,15,11,-0.25,1.4,11,-0.25,0.8,13,-0.25,-15],
// 3 15 11 -0.25 0.8 11 -0.25 -0.8 13 -0.25 -15
  [3,15,11,-0.25,0.8,11,-0.25,-0.8,13,-0.25,-15],
// 4 15 11 -0.25 -0.8 11 -0.25 0.8 5.4 -0.25 0.8 4 -0.25 -0.8
  [4,15,11,-0.25,-0.8,11,-0.25,0.8,5.4,-0.25,0.8,4,-0.25,-0.8],
// 3 15 11 -0.25 -0.8 11 -0.25 -1.4 13 -0.25 -15
  [3,15,11,-0.25,-0.8,11,-0.25,-1.4,13,-0.25,-15],
// 4 15 13 -0.25 -15 11 -0.25 -1.4 11 -0.25 -3 11.9 -0.25 -9
  [4,15,13,-0.25,-15,11,-0.25,-1.4,11,-0.25,-3,11.9,-0.25,-9],
// 4 15 11.6 -0.25 -7.9 11.9 -0.25 -9 11 -0.25 -3 11 -0.25 -3.6
  [4,15,11.6,-0.25,-7.9,11.9,-0.25,-9,11,-0.25,-3,11,-0.25,-3.6],
// 3 15 11 -0.25 -3.6 11 -0.25 -5.2 11.6 -0.25 -7.9
  [3,15,11,-0.25,-3.6,11,-0.25,-5.2,11.6,-0.25,-7.9],
// 4 15 11 -0.25 -5.2 11 -0.25 -3.6 -1 -0.25 -3.6 -2.1 -0.25 -5.2
  [4,15,11,-0.25,-5.2,11,-0.25,-3.6,-1,-0.25,-3.6,-2.1,-0.25,-5.2],
// 3 15 11 -0.25 -5.2 11 -0.25 -5.8 11.6 -0.25 -7.9
  [3,15,11,-0.25,-5.2,11,-0.25,-5.8,11.6,-0.25,-7.9],
// 3 15 11 -0.25 -5.8 10.7 -0.25 -7.6 11.6 -0.25 -7.9
  [3,15,11,-0.25,-5.8,10.7,-0.25,-7.6,11.6,-0.25,-7.9],
// 4 15 9.5 -0.25 -7.9 10.7 -0.25 -7.6 11 -0.25 -5.8 8.1 -0.25 -7.9
  [4,15,9.5,-0.25,-7.9,10.7,-0.25,-7.6,11,-0.25,-5.8,8.1,-0.25,-7.9],
// 3 15 9.5 -0.25 -7.9 8.1 -0.25 -7.9 8.8 -0.25 -8.6
  [3,15,9.5,-0.25,-7.9,8.1,-0.25,-7.9,8.8,-0.25,-8.6],
// 3 15 11 -0.25 -5.8 6.9 -0.25 -7.6 8.1 -0.25 -7.9
  [3,15,11,-0.25,-5.8,6.9,-0.25,-7.6,8.1,-0.25,-7.9],
// 4 15 4 -0.25 -7.4 6.9 -0.25 -7.6 11 -0.25 -5.8 -2.5 -0.25 -5.8
  [4,15,4,-0.25,-7.4,6.9,-0.25,-7.6,11,-0.25,-5.8,-2.5,-0.25,-5.8],
// 3 15 -2.5 -0.25 -5.8 -3.5 -0.25 -7.4 4 -0.25 -7.4
  [3,15,-2.5,-0.25,-5.8,-3.5,-0.25,-7.4,4,-0.25,-7.4],
// 4 15 6 -0.25 -7.9 6.9 -0.25 -7.6 4 -0.25 -7.4 4 -0.25 -8
  [4,15,6,-0.25,-7.9,6.9,-0.25,-7.6,4,-0.25,-7.4,4,-0.25,-8],
// 4 15 5.7 -0.25 -9 6 -0.25 -7.9 4 -0.25 -8 4 -0.25 -9.6
  [4,15,5.7,-0.25,-9,6,-0.25,-7.9,4,-0.25,-8,4,-0.25,-9.6],
// 4 15 4 -0.25 -9.6 4 -0.25 -8 -3.9 -0.25 -8 -9.8 -0.25 -9.6
  [4,15,4,-0.25,-9.6,4,-0.25,-8,-3.9,-0.25,-8,-9.8,-0.25,-9.6],
// 3 15 -3.9 -0.25 -8 -4.3 -0.25 -8 -9.8 -0.25 -9.6
  [3,15,-3.9,-0.25,-8,-4.3,-0.25,-8,-9.8,-0.25,-9.6],
// 3 15 -4.3 -0.25 -8 -9.8 -0.25 -8 -9.8 -0.25 -9.6
  [3,15,-4.3,-0.25,-8,-9.8,-0.25,-8,-9.8,-0.25,-9.6],
// 4 15 6.1 -0.25 -10.2 5.7 -0.25 -9 4 -0.25 -9.6 4 -0.25 -10.2
  [4,15,6.1,-0.25,-10.2,5.7,-0.25,-9,4,-0.25,-9.6,4,-0.25,-10.2],
// 4 15 7.4 -0.25 -11.5 6.1 -0.25 -10.2 4 -0.25 -10.2 -9.8 -0.25 -13.5
  [4,15,7.4,-0.25,-11.5,6.1,-0.25,-10.2,4,-0.25,-10.2,-9.8,-0.25,-13.5],
// 3 15 4 -0.25 -10.2 -9.8 -0.25 -10.2 -9.8 -0.25 -13.5
  [3,15,4,-0.25,-10.2,-9.8,-0.25,-10.2,-9.8,-0.25,-13.5],
// 3 15 11.9 -0.25 -9 11.5 -0.25 -10.2 13 -0.25 -15
  [3,15,11.9,-0.25,-9,11.5,-0.25,-10.2,13,-0.25,-15],
// 3 15 11.5 -0.25 -10.2 10.2 -0.25 -11.5 13 -0.25 -15
  [3,15,11.5,-0.25,-10.2,10.2,-0.25,-11.5,13,-0.25,-15],
// 3 15 10.2 -0.25 -11.5 8.8 -0.25 -12.5 13 -0.25 -15
  [3,15,10.2,-0.25,-11.5,8.8,-0.25,-12.5,13,-0.25,-15],
// 4 15 13 -0.25 -15 8.8 -0.25 -12.5 -9.8 -0.25 -13.5 -13 -0.25 -15
  [4,15,13,-0.25,-15,8.8,-0.25,-12.5,-9.8,-0.25,-13.5,-13,-0.25,-15],
// 3 15 7.4 -0.25 -11.5 -9.8 -0.25 -13.5 8.8 -0.25 -12.5
  [3,15,7.4,-0.25,-11.5,-9.8,-0.25,-13.5,8.8,-0.25,-12.5],
// 3 15 -9.8 -0.25 -13.5 -10.4 -0.25 -13.5 -13 -0.25 -15
  [3,15,-9.8,-0.25,-13.5,-10.4,-0.25,-13.5,-13,-0.25,-15],
// 4 15 -13 -0.25 -10.2 -13 -0.25 -15 -10.4 -0.25 -13.5 -10.4 -0.25 -10.2
  [4,15,-13,-0.25,-10.2,-13,-0.25,-15,-10.4,-0.25,-13.5,-10.4,-0.25,-10.2],
// 3 15 11 -0.25 -1.4 3.5 -0.25 -1.4 11 -0.25 -3
  [3,15,11,-0.25,-1.4,3.5,-0.25,-1.4,11,-0.25,-3],
];
module ldraw_lib__4650852c(step=0, col=false, unit=2/5, alt=false, line=0.2, solid=!$preview)
    makepoly(ldraw_lib__4650852c(), step=step, col=col, unit=unit, alt=alt, line=line, solid=solid);
ldraw_lib__4650852c(line=0.2);
